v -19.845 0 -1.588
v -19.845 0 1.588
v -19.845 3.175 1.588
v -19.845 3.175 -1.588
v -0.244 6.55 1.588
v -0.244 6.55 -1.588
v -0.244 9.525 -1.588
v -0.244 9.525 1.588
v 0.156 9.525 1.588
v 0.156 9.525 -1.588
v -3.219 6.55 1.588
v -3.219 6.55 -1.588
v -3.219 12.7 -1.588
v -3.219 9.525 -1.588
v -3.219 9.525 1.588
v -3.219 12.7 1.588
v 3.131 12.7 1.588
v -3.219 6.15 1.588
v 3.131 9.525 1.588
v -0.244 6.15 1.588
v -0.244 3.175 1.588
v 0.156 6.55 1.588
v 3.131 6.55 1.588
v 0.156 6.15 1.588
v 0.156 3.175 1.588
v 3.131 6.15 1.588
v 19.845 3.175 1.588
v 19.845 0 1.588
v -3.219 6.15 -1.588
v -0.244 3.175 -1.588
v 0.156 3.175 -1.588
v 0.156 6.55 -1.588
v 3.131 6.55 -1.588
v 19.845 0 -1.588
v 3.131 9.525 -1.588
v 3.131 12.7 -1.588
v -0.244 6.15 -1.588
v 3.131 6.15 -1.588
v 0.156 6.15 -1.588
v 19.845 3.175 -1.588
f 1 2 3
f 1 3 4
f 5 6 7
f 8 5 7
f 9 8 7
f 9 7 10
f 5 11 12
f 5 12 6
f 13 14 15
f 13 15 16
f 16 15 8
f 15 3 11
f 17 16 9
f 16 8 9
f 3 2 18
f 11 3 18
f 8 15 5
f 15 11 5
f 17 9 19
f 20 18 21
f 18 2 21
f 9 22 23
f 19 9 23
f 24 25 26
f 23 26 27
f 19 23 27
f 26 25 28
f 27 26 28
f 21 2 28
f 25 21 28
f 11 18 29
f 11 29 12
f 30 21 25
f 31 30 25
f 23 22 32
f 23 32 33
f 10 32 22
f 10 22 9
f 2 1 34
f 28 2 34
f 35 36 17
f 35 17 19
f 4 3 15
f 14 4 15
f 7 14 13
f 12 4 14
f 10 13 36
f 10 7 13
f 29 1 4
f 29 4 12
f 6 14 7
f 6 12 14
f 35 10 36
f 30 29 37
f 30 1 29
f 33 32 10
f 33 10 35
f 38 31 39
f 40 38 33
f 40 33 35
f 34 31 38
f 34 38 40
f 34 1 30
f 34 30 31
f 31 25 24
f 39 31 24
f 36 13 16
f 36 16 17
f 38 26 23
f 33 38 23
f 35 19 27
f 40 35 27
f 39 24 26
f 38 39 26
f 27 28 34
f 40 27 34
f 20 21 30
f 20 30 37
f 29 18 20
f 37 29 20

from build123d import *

# Parameters (mm, degrees)
SKETCH1_W           = 39.69
SKETCH1_H           = 3.175
BOSS_EXTRUDE1_DEPTH = 12.7
SKETCH3_W           = 6.35
SKETCH3_H           = 0.4
SKETCH3_W_2         = 0.4
SKETCH3_H_2         = 6.35
CUT_EXTRUDE7_DEPTH  = 3.175
CUT_EXTRUDE8_DEPTH  = 3.175


with BuildPart() as part:
    # Sketch1 → Boss-Extrude1 (new body)
    with BuildSketch(Plane(origin=(0, 0, 0), x_dir=(1, 0, 0), z_dir=(0, 1, 0))):
        Rectangle(SKETCH1_W, SKETCH1_H)
    extrude(amount=BOSS_EXTRUDE1_DEPTH)

    # Sketch3 → Cut-Extrude7 (cut)
    with BuildSketch(Plane.XY.offset(1.5875)):
        with Locations((-0.043891751, 6.35)):
            Rectangle(SKETCH3_W, SKETCH3_H)
        with Locations((-0.043891751, 6.35)):
            Rectangle(SKETCH3_W_2, SKETCH3_H_2)
    extrude(amount=-CUT_EXTRUDE7_DEPTH, mode=Mode.SUBTRACT)

    # Sketch6 → Cut-Extrude8 (cut)
    with BuildSketch(Plane.XY.offset(1.5875)):
        Polygon((-3.218891751, 9.525), (-3.218891751, 12.7), (-19.845, 12.7), (-19.845, 3.175), align=None)
        Polygon((19.845, 12.7), (3.131108249, 12.7), (3.131108249, 9.525), (19.845, 3.175), align=None)
    extrude(amount=-CUT_EXTRUDE8_DEPTH, mode=Mode.SUBTRACT)


solid = part.part
